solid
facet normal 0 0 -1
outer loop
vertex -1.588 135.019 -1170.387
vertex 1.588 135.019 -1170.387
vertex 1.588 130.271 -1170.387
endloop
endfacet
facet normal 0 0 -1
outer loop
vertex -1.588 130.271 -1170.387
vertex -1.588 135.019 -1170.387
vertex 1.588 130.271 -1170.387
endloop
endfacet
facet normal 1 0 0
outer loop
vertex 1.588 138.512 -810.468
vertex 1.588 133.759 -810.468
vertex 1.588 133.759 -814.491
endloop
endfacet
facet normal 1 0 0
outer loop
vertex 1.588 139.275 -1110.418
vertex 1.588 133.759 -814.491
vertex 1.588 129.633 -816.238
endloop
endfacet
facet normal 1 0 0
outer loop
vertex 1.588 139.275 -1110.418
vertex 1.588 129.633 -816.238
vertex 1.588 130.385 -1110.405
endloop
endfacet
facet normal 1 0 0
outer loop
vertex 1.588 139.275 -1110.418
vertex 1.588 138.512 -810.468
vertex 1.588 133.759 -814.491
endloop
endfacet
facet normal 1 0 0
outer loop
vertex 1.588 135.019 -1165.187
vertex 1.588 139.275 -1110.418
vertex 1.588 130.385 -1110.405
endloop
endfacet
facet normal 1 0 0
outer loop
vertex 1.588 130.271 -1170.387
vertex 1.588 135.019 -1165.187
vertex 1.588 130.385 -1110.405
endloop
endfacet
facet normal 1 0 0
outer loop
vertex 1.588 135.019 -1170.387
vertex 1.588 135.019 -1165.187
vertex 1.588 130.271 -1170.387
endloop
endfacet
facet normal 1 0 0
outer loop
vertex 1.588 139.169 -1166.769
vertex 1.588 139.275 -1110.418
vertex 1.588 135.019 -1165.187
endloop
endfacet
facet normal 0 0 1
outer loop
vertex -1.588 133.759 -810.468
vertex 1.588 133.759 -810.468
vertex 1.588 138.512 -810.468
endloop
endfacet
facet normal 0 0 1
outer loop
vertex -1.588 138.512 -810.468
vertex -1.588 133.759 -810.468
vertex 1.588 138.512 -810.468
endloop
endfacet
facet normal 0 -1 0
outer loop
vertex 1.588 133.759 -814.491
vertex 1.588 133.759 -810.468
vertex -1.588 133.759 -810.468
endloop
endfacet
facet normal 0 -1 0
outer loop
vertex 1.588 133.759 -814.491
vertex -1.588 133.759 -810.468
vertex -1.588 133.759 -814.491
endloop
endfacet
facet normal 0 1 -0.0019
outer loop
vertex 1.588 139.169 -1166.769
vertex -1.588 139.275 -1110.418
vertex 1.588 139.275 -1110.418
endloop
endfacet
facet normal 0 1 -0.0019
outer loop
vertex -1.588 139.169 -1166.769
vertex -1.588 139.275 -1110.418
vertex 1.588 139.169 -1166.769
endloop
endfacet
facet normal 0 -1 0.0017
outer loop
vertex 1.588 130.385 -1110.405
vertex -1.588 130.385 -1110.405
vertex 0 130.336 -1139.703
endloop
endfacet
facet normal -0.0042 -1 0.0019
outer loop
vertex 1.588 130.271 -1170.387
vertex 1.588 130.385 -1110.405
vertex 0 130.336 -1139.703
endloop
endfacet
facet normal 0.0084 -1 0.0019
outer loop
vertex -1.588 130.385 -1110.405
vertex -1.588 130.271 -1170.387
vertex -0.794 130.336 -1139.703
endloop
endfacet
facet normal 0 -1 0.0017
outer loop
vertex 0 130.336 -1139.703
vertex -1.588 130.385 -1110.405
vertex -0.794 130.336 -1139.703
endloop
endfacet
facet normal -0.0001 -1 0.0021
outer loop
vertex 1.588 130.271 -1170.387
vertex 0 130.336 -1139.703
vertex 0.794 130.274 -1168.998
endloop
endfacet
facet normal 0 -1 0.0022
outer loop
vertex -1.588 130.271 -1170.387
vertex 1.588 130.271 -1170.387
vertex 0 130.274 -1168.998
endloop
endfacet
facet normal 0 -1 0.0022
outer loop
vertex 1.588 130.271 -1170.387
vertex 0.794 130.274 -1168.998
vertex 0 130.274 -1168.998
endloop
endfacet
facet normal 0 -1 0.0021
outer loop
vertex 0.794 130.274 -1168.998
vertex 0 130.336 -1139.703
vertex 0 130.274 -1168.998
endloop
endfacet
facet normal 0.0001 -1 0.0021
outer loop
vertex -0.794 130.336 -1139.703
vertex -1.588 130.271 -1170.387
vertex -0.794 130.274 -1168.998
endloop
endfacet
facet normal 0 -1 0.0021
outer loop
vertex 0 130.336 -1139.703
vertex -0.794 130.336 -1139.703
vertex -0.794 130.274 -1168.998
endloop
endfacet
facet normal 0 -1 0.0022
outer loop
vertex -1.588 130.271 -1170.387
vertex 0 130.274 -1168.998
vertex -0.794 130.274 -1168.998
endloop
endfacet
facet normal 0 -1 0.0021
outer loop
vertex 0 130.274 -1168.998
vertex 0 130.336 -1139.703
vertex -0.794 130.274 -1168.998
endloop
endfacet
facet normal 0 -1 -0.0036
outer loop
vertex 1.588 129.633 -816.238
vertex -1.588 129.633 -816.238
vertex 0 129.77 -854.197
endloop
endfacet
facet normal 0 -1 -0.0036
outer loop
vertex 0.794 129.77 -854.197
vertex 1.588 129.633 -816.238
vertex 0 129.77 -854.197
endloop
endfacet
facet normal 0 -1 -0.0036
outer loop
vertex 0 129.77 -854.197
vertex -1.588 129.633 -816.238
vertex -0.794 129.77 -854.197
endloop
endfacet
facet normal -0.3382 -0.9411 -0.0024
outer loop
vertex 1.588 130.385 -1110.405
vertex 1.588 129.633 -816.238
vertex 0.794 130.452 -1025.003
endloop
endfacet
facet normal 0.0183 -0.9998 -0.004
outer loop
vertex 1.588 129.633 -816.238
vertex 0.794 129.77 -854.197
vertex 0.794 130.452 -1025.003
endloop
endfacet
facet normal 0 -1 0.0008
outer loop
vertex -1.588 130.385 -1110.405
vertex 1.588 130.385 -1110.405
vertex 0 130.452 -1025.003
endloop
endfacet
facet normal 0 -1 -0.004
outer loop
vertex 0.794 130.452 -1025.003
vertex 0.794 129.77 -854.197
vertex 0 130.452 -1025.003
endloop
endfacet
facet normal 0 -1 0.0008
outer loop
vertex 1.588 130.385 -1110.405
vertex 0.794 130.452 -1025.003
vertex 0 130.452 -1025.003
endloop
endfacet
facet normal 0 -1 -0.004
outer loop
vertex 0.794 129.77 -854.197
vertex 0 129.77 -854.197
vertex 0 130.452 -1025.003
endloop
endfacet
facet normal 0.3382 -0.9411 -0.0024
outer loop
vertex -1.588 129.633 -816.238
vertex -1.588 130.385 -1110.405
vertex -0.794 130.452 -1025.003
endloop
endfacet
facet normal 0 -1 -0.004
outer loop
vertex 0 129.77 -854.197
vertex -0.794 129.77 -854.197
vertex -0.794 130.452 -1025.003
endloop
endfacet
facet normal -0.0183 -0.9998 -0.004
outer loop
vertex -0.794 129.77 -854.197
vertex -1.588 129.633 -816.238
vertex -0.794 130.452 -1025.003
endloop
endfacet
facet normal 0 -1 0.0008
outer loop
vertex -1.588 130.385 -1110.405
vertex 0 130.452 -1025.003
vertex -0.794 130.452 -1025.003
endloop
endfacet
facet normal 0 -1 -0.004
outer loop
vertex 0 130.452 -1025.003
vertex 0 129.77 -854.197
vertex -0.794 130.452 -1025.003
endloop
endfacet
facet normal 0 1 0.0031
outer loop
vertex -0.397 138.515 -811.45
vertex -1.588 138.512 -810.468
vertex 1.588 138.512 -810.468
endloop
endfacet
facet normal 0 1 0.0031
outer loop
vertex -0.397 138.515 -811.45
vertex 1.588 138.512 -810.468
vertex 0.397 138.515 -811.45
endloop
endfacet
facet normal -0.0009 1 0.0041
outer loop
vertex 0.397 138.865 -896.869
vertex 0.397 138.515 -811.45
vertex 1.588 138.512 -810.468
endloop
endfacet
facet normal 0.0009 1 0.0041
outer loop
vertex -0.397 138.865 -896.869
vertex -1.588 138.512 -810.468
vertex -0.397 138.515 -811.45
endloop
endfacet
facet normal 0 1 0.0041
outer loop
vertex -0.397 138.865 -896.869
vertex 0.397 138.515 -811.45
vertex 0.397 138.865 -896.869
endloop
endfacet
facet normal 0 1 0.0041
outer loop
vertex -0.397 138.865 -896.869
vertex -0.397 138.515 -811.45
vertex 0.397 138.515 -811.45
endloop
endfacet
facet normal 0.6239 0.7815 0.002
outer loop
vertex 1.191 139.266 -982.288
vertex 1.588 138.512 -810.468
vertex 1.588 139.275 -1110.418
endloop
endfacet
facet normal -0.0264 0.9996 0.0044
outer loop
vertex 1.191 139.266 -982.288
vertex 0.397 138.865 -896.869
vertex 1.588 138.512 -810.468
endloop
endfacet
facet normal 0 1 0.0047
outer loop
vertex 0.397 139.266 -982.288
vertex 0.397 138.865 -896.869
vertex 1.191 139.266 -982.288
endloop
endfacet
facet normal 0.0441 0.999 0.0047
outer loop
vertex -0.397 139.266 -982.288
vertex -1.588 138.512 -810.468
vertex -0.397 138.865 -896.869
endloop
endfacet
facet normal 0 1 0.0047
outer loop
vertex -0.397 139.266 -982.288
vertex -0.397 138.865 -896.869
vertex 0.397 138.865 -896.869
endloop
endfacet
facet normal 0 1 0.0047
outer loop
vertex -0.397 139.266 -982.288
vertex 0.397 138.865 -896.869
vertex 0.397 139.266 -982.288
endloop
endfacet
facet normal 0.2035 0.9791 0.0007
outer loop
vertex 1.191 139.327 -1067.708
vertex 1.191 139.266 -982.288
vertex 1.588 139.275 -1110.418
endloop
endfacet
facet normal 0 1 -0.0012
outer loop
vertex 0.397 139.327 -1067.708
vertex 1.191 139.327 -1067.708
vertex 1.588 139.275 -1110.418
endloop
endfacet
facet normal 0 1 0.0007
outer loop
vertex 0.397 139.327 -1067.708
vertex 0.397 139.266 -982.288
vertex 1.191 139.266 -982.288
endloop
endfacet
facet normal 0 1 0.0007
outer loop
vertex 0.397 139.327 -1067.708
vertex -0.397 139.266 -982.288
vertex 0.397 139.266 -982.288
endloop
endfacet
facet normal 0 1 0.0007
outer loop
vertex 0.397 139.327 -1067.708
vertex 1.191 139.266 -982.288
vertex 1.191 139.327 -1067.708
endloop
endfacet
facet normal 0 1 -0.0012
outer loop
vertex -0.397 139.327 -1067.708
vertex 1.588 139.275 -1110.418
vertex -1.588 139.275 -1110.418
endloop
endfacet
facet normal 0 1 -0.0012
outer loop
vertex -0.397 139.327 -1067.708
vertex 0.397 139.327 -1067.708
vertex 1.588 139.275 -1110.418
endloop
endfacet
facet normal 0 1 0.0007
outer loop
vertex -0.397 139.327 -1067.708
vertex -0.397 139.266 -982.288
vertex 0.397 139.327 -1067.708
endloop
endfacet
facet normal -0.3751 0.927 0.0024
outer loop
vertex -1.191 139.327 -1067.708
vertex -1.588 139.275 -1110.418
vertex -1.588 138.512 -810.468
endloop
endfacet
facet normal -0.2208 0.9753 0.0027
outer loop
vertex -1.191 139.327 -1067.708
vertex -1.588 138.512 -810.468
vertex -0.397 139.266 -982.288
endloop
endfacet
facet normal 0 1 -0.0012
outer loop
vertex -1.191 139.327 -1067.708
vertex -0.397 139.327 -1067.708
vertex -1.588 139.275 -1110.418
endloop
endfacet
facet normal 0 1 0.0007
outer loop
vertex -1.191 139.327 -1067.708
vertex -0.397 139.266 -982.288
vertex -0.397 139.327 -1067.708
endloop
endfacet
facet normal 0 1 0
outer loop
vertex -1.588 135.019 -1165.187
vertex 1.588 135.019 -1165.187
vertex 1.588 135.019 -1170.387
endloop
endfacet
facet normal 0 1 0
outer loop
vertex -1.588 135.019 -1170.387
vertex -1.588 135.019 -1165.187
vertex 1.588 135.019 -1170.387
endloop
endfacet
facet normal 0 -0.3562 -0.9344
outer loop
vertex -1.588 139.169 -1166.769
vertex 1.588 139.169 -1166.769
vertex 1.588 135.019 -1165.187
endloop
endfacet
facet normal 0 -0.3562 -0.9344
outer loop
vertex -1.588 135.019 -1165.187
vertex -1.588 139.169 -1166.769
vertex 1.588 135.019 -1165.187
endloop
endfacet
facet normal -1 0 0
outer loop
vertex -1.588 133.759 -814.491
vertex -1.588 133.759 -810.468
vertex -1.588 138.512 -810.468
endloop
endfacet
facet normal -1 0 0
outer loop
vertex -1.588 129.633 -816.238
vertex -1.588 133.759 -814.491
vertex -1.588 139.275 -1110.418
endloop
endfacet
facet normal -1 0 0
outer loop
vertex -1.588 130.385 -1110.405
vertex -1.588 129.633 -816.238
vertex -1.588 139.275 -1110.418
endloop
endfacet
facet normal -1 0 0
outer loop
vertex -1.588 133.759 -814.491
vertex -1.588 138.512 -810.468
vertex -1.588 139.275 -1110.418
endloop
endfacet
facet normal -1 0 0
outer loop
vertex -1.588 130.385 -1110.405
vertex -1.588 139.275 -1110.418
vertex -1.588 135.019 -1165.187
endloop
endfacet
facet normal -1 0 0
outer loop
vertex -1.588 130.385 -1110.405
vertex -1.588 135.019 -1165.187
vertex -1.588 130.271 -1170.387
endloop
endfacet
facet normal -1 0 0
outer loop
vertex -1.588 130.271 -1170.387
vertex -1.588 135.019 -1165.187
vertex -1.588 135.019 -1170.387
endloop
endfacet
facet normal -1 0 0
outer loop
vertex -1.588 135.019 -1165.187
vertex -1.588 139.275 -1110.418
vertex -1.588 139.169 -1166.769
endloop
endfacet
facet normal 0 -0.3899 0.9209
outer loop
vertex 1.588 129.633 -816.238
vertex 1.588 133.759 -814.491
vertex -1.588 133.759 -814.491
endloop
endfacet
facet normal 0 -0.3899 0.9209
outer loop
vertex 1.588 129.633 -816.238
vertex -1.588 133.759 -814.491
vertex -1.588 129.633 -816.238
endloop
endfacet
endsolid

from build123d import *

# Parameters (mm, degrees)
BOSS_EXTRUDE1_START = -1.5875
BOSS_EXTRUDE1_DEPTH = 3.175
FILLET1_R           = 2.54
CUT_EXTRUDE1_DEPTH  = 2674.191025632
FILLET2_R           = 0.762
FILLET3_R           = 0.762
CUT_EXTRUDE2_DEPTH  = 7.62


with BuildPart() as part:
    # Boss-Extrude1: read off the stored shape, not the designer's step
    # Boss-Extrude1 outline → Boss-Extrude1 (new body)
    with BuildSketch(Plane(origin=(0, 0, 0), x_dir=(0, 0, -1), z_dir=(1, 0, 0)).offset(BOSS_EXTRUDE1_START)):
        with BuildLine():
            add(Edge.make_bspline(
                [(1110.404970926, 130.384545774), (1120.170834465, 130.370061323), (1139.703057908, 130.338772026), (1168.998370974, 130.277673039), (1198.290610395, 130.194386876), (1217.81419633, 130.113940836), (1227.576506903, 130.06508052)],
                knots=[0, 0, 0, 0, 0.25, 0.5, 0.75, 1, 1, 1, 1], degree=3))
            add(Edge.make_bspline(
                [(1227.576506903, 130.06508052), (1269.911205773, 129.853195249), (1333.427746701, 129.273373321), (1418.042208161, 127.449050563), (1502.665994832, 124.913583682), (1608.454176987, 120.803299479), (1693.070073331, 116.848243245), (1735.369787733, 114.744712179)],
                knots=[0, 0, 0, 0, 0.25, 0.375, 0.5, 0.75, 1, 1, 1, 1], degree=3))
            add(Edge.make_bspline(
                [(1735.369787733, 114.744712179), (1815.995940723, 110.735232018), (1936.906650462, 104.096364548), (2098.049485168, 94.18797875), (2198.694736725, 87.314638509), (2279.130413747, 81.114418931), (2339.412950304, 76.034076608), (2399.564054334, 70.28270545), (2479.570468264, 61.127378254), (2559.292087872, 49.650907614), (2626.797554585, 38.235484735), (2656.889518578, 32.788503969), (2667.159793662, 30.877771266), (2669.54, 30.432069924)],
                knots=[0, 0, 0, 0, 0.25, 0.375, 0.5, 0.5625, 0.625, 0.6875, 0.75, 0.875, 0.9375, 0.96241067, 0.969928536, 0.969928536, 0.969928536, 0.969928536], degree=3))
            Line((2669.54, 30.432069924), (2669.54, 39.476142465))
            add(Edge.make_bspline(
                [(1735.811334709, 123.623740069), (1776.138635499, 121.618292624), (1816.460281579, 119.500621806), (1897.093668675, 115.087561885), (1937.405638896, 112.792971084), (2018.018419045, 108.018366523), (2058.319512223, 105.539122976), (2138.903780144, 100.307240032), (2179.18739793, 97.555127955), (2239.586998714, 93.080168687), (2259.716280977, 91.529837622), (2289.900442602, 89.09084343), (2299.960179135, 88.258845039), (2320.076004566, 86.552861654), (2330.132100898, 85.678962223), (2350.239356518, 83.874334847), (2360.290489794, 82.943307484), (2380.385973971, 81.003183297), (2390.430065378, 79.993418555), (2420.547026195, 76.827577532), (2440.60648589, 74.533672955), (2480.675569568, 69.556278523), (2500.68715183, 66.874150811), (2540.654290207, 61.150246295), (2560.611026428, 58.109755646), (2600.475457131, 51.702465574), (2620.382967089, 48.337538888), (2650.028116889, 43.072156367), (2659.78844051, 41.29687683), (2669.54, 39.476142465)],
                knots=[0, 0, 0, 0, 0.125, 0.125, 0.25, 0.25, 0.375, 0.375, 0.5, 0.5, 0.5625, 0.5625, 0.59375, 0.59375, 0.625, 0.625, 0.65625, 0.65625, 0.6875, 0.6875, 0.75, 0.75, 0.8125, 0.8125, 0.875, 0.875, 0.9375, 0.9375, 0.968210768, 0.968210768, 0.968210768, 0.968210768], degree=3))
            add(Edge.make_bspline(
                [(1227.621000751, 138.954969175), (1248.807303679, 138.848931677), (1269.993583155, 138.701170252), (1312.363832348, 138.270664618), (1333.547719008, 137.987407832), (1375.912368189, 137.249274813), (1397.09309738, 136.7925677), (1439.451328259, 135.701855835), (1460.629010312, 135.069210584), (1502.979101161, 133.670541385), (1524.152152736, 132.907434339), (1566.494303759, 131.284732459), (1587.663166024, 130.423163385), (1651.164052809, 127.709123983), (1693.490421561, 125.728325331), (1735.811334709, 123.623740069)],
                knots=[0, 0, 0, 0, 0.125, 0.125, 0.25, 0.25, 0.375, 0.375, 0.5, 0.5, 0.625, 0.625, 0.75, 0.75, 1, 1, 1, 1], degree=3))
            add(Edge.make_bspline(
                [(1110.418156307, 139.274535996), (1129.952027249, 139.245563914), (1149.485893504, 139.211997476), (1188.553558893, 139.115899087), (1208.087346834, 139.052735015), (1227.621000751, 138.954969175)],
                knots=[0, 0, 0, 0, 0.5, 0.5, 1, 1, 1, 1], degree=3))
            add(Edge.make_bspline(
                [(768.740124165, 138.468408213), (782.976796045, 138.460280143), (797.213453801, 138.479500079), (825.686695051, 138.549690296), (839.923258916, 138.600062665), (868.396318956, 138.719026333), (882.632808962, 138.789607972), (911.105746117, 138.939594729), (925.342197007, 139.018479563), (953.81517223, 139.160090703), (968.051699178, 139.222241505), (996.524919377, 139.30995407), (1010.761605517, 139.335014039), (1039.234912871, 139.349647552), (1053.471562869, 139.340493535), (1081.944860968, 139.313691902), (1096.181508981, 139.29565137), (1110.418156307, 139.274535996)],
                knots=[0, 0, 0, 0, 0.125, 0.125, 0.25, 0.25, 0.375, 0.375, 0.5, 0.5, 0.625, 0.625, 0.75, 0.75, 0.875, 0.875, 1, 1, 1, 1], degree=3))
            add(Edge.make_bspline(
                [(630.778432202, 139.251437536), (653.771819614, 139.075315664), (676.765000849, 138.871740519), (711.255349111, 138.647690701), (722.752238945, 138.586174182), (745.746099074, 138.499784896), (757.243084259, 138.474972158), (768.740124165, 138.468408213)],
                knots=[0, 0, 0, 0, 0.5, 0.5, 0.75, 0.75, 1, 1, 1, 1], degree=3))
            add(Edge.make_bspline(
                [(604.514984259, 139.433685568), (609.940743136, 139.400696354), (618.695242427, 139.342071397), (627.449694696, 139.276935028), (630.778432202, 139.251437536)],
                knots=[0, 0, 0, 0, 0.619765686, 1, 1, 1, 1], degree=3))
            ThreePointArc((604.514984259, 139.433685568), (600.549356142, 139.457173081), (596.583720644, 139.479379304))
            add(Edge.make_bspline(
                [(436.133018826, 139.357176562), (449.50393779, 139.390650739), (462.874888934, 139.412366015), (489.61665939, 139.498555977), (502.987497127, 139.559076553), (529.729299233, 139.628029754), (543.100240501, 139.639230481), (569.84212102, 139.601013959), (583.212960696, 139.552035302), (596.583720644, 139.479379304)],
                knots=[0, 0, 0, 0, 0.25, 0.25, 0.5, 0.5, 0.75, 0.75, 1, 1, 1, 1], degree=3))
            add(Edge.make_bspline(
                [(432.263917423, 139.347117104), (433.553617637, 139.350567112), (434.843318039, 139.353947814), (436.133018826, 139.357176562)],
                knots=[0, 0, 0, 0, 1, 1, 1, 1], degree=3))
            add(Edge.make_bspline(
                [(420.316232014, 139.305761868), (422.413235913, 139.315186344), (426.395793967, 139.330351666), (430.378363115, 139.342073082), (432.263917423, 139.347117104)],
                knots=[0, 0, 0, 0, 0.526548575, 1, 1, 1, 1], degree=3))
            add(Edge.make_bspline(
                [(376.410119779, 138.75403864), (383.726317086, 138.935561778), (391.043801196, 139.055611797), (405.679602634, 139.224192856), (412.997895507, 139.272871444), (420.316232014, 139.305761868)],
                knots=[0, 0, 0, 0, 0.5, 0.5, 1, 1, 1, 1], degree=3))
            add(Edge.make_bspline(
                [(336.49221538, 137.002990798), (349.782924989, 137.88646357), (363.094318653, 138.423658969), (376.410119779, 138.75403864)],
                knots=[0, 0, 0, 0, 1, 1, 1, 1], degree=3))
            add(Edge.make_bspline(
                [(322.369488076, 135.928469458), (327.073374868, 136.333386449), (331.781331813, 136.689844531), (336.49221538, 137.002990798)],
                knots=[0, 0, 0, 0, 1, 1, 1, 1], degree=3))
            add(Edge.make_bspline(
                [(269.769949315, 129.47895505), (274.123387467, 130.231879276), (278.485668028, 130.925946417), (287.22796256, 132.196043087), (291.608626646, 132.771988738), (300.381777496, 133.818422146), (304.774579419, 134.288963443), (313.567800313, 135.154375086), (317.967903853, 135.549407043), (322.369488076, 135.928469458)],
                knots=[0, 0, 0, 0, 0.25, 0.25, 0.5, 0.5, 0.75, 0.75, 1, 1, 1, 1], degree=3))
            add(Edge.make_bspline(
                [(135.15718457, 90.054634926), (146.043739673, 94.375230064), (156.99891695, 98.504335222), (173.56622243, 104.322560697), (179.110932848, 106.199810145), (190.24859245, 109.819698901), (195.841545849, 111.562316625), (207.065472514, 114.901345648), (212.697969124, 116.49836249), (224.005973618, 119.540534541), (229.683240596, 120.9862349), (246.767187276, 125.077694043), (258.225188059, 127.482295924), (269.769949315, 129.47895505)],
                knots=[0, 0, 0, 0, 0.25, 0.25, 0.375, 0.375, 0.5, 0.5, 0.625, 0.625, 0.75, 0.75, 1, 1, 1, 1], degree=3))
            add(Edge.make_bspline(
                [(107.049744533, 78.466050261), (116.373258882, 82.438606419), (125.737350123, 86.316143859), (135.15718457, 90.054634926)],
                knots=[0, 0, 0, 0, 1, 1, 1, 1], degree=3))
            add(Edge.make_bspline(
                [(99.06, 75.03568963), (99.223542669, 75.106424562), (100.635498802, 75.716852689), (103.297453866, 76.863328103), (105.798503999, 77.932922637), (107.049744533, 78.466050261)],
                knots=[0.484151133, 0.484151133, 0.484151133, 0.484151133, 0.515864471, 0.757931449, 1, 1, 1, 1], degree=3))
            Line((99.06, 75.03568963), (99.06, 65.345043949))
            add(Edge.make_bspline(
                [(99.06, 65.345043949), (99.380370965, 65.484464523), (100.637671455, 66.031176319), (103.17753745, 67.132002814), (106.681577323, 68.64166857), (109.249580285, 69.740028797), (110.534459652, 70.287489229)],
                knots=[0.254738807, 0.254738807, 0.254738807, 0.254738807, 0.317238807, 0.5, 0.75, 1, 1, 1, 1], degree=3))
            add(Edge.make_bspline(
                [(110.534459652, 70.287489229), (112.850658013, 71.274373329), (117.489277519, 73.236837099), (124.456688526, 76.138068453), (131.438476528, 78.994265342), (136.101204469, 80.864754132), (138.436571012, 81.791601309)],
                knots=[0, 0, 0, 0, 0.25, 0.5, 0.75, 1, 1, 1, 1], degree=3))
            add(Edge.make_bspline(
                [(138.436571012, 81.791601309), (143.826897197, 83.930883835), (154.6522834, 88.11877139), (176.408203186, 96.037596764), (203.906835742, 104.998187521), (237.39469787, 114.027149543), (259.934818065, 118.755998441), (271.284977744, 120.719001348)],
                knots=[0, 0, 0, 0, 0.125, 0.25, 0.5, 0.75, 1, 1, 1, 1], degree=3))
            add(Edge.make_bspline(
                [(271.284977744, 120.719001348), (275.558711595, 121.458140765), (284.124297478, 122.821139095), (297.036360548, 124.518896272), (310.018420247, 125.909880891), (318.766623126, 126.695286194), (323.13209925, 127.071239405)],
                knots=[5e-09, 5e-09, 5e-09, 5e-09, 0.2499992, 0.4999984, 0.7499976, 0.999996801, 0.999996801, 0.999996801, 0.999996801], degree=3))
            add(Edge.make_bspline(
                [(323.13209925, 127.071239405), (324.293050056, 127.171175344), (326.615168427, 127.365043892), (330.101568176, 127.638529754), (333.590184216, 127.895089457), (335.917953069, 128.055198639), (337.081858513, 128.132566852)],
                knots=[1.2024e-05, 1.2024e-05, 1.2024e-05, 1.2024e-05, 0.250009018, 0.500006012, 0.750003006, 1, 1, 1, 1], degree=3))
            add(Edge.make_bspline(
                [(337.081858513, 128.132566852), (340.367862287, 128.350997241), (346.939906877, 128.744909116), (356.821319657, 129.221190111), (366.716250393, 129.595096292), (373.326613137, 129.784797569), (376.630622597, 129.866773678)],
                knots=[0, 0, 0, 0, 0.25, 0.5, 0.75, 1, 1, 1, 1], degree=3))
            add(Edge.make_bspline(
                [(376.630622597, 129.866773678), (380.266394474, 129.956981294), (387.534764147, 130.106779908), (398.462206547, 130.259361028), (409.400972015, 130.358727994), (416.705417778, 130.39944419), (420.356185481, 130.415851648)],
                knots=[0, 0, 0, 0, 0.25, 0.5, 0.75, 1, 1, 1, 1], degree=3))
            add(Edge.make_bspline(
                [(420.356185481, 130.415851648), (421.350045129, 130.420318309), (423.337533562, 130.428603137), (426.320174328, 130.439402209), (429.303468332, 130.448883952), (431.293011648, 130.454488038), (432.287698861, 130.457148912)],
                knots=[0, 0, 0, 0, 0.25, 0.5, 0.75, 1, 1, 1, 1], degree=3))
            add(Edge.make_bspline(
                [(432.287698861, 130.457148912), (432.610032304, 130.45801117), (433.254717136, 130.45972707), (434.221637716, 130.462266911), (435.188505114, 130.464765142), (435.833012253, 130.466397641), (436.155274747, 130.46720442)],
                knots=[9.2e-08, 9.2e-08, 9.2e-08, 9.2e-08, 0.25, 0.5, 0.75, 1, 1, 1, 1], degree=3))
            add(Edge.make_bspline(
                [(436.155274747, 130.46720442), (449.528322363, 130.500683927), (476.275740382, 130.546633815), (516.38896029, 130.728798697), (556.456290895, 130.759667498), (583.176533448, 130.662101975), (596.535396133, 130.589510646)],
                knots=[0, 0, 0, 0, 0.249999973, 0.499999946, 0.749999918, 0.999999891, 0.999999891, 0.999999891, 0.999999891], degree=3))
            ThreePointArc((596.535396133, 130.589510646), (600.498158983, 130.567320504), (604.460914457, 130.543849998))
            add(Edge.make_bspline(
                [(604.460914457, 130.543849998), (606.648150431, 130.530551362), (611.022503017, 130.502867011), (617.584689429, 130.458405465), (624.147187284, 130.411339888), (628.522663802, 130.378455494), (630.7103385, 130.361698324)],
                knots=[-7.09e-07, -7.09e-07, -7.09e-07, -7.09e-07, 0.249999468, 0.499999646, 0.749999823, 1, 1, 1, 1], degree=3))
            add(Edge.make_bspline(
                [(630.7103385, 130.361698324), (642.206126489, 130.273644326), (665.193556095, 130.083785311), (699.699077953, 129.819212193), (734.21504011, 129.634735151), (757.228597075, 129.58497898), (768.735048644, 129.578409662)],
                knots=[0, 0, 0, 0, 0.25, 0.5, 0.75, 1, 1, 1, 1], degree=3))
            add(Edge.make_bspline(
                [(768.735048644, 129.578409662), (797.222409768, 129.56214552), (854.203652026, 129.725124503), (939.635195481, 130.236578518), (1024.992958464, 130.524931921), (1081.937612336, 130.426767717), (1110.404970926, 130.384545774)],
                knots=[0, 0, 0, 0, 0.25, 0.5, 0.75, 1, 1, 1, 1], degree=3))
        make_face()
    extrude(amount=BOSS_EXTRUDE1_DEPTH)

    # Fillet1
    fillet1_edges = [part.edges().sort_by_distance(p)[0] for p in [
        (0, 39.476142465, -2669.54),
        (0, 30.432069924, -2669.54),
        (0, 65.345043949, -99.06),
        (0, 75.03568963, -99.06),
    ]]
    fillet(fillet1_edges, radius=FILLET1_R)

    # Sketch4 → Cut-Extrude1 (cut, through all)
    with BuildSketch(Plane(origin=(1.5875, 0, 0), x_dir=(0, 0, -1), z_dir=(1, 0, 0))):
        Polygon((1827.2125, 118.895836595), (1827.2125, 110.000384115), (1827.2125, 78.791710134), (2135.1875, 78.791710134), (2135.1875, 91.599357392), (2135.1875, 100.508307819), (2135.1875, 129.353842083), (1827.2125, 129.353842083), align=None)
    extrude(amount=-CUT_EXTRUDE1_DEPTH, mode=Mode.SUBTRACT)


with BuildPart() as cut_extrude1_piece_1:
    # of the separate pieces the step leaves, piece 1, a body of its own (cut_extrude1_pieces)
    add(part.part.solids().sort_by_distance((-1.5875, 114.744712179, -1735.369787733))[0])

    # Fillet2
    fillet2_edges = [cut_extrude1_piece_1.edges().sort_by_distance(p)[0] for p in [
        (0, 118.895836595, -1827.2125),
        (0, 110.000384116, -1827.2125),
    ]]
    fillet(fillet2_edges, radius=FILLET2_R)


with BuildPart() as cut_extrude1_piece_2:
    # of the separate pieces the step leaves, piece 2, a body of its own (cut_extrude1_pieces)
    add(part.part.solids().sort_by_distance((-1.5875, 91.599357392, -2135.1875))[0])

    # Fillet3
    fillet3_edges = [cut_extrude1_piece_2.edges().sort_by_distance(p)[0] for p in [
        (0, 100.508307819, -2135.1875),
        (0, 91.599357392, -2135.1875),
    ]]
    fillet(fillet3_edges, radius=FILLET3_R)


with BuildPart() as cut_extrude2_tool:
    # Sketch5 → Cut-Extrude2 (new body)
    with BuildSketch(Plane(origin=(1.5875, 0, 0), x_dir=(0, 0, -1), z_dir=(1, 0, 0))):
        Polygon((810.468029574, 138.512199639), (810.468029574, 133.759282778), (814.491468237, 133.759282778), (816.238424635, 129.632745348), (816.238424635, 106.608138071), (55.182537973, 0), (26.685618653, 153.088449224), (810.468029574, 153.088449224), align=None)
        Polygon((1166.769177473, 139.169420645), (1165.186656638, 135.018963115), (1170.386904229, 135.018963115), (1170.386904229, 130.270526743), (1170.386904229, 114.196578451), (2691.040068031, -74.953739753), (2732.471219555, 153.088449224), (1166.769177473, 153.088449224), align=None)
    extrude(amount=-CUT_EXTRUDE2_DEPTH)


with BuildPart() as cut_extrude1_piece_1_1:
    add(cut_extrude1_piece_1.part)

    # Cut-Extrude2: cut by cut_extrude2_tool
    add(cut_extrude2_tool.part, mode=Mode.SUBTRACT)


with BuildPart() as cut_extrude1_piece_2_1:
    add(cut_extrude1_piece_2.part)

    # Cut-Extrude2: cut by cut_extrude2_tool
    add(cut_extrude2_tool.part, mode=Mode.SUBTRACT)


solid = cut_extrude1_piece_1_1.part
